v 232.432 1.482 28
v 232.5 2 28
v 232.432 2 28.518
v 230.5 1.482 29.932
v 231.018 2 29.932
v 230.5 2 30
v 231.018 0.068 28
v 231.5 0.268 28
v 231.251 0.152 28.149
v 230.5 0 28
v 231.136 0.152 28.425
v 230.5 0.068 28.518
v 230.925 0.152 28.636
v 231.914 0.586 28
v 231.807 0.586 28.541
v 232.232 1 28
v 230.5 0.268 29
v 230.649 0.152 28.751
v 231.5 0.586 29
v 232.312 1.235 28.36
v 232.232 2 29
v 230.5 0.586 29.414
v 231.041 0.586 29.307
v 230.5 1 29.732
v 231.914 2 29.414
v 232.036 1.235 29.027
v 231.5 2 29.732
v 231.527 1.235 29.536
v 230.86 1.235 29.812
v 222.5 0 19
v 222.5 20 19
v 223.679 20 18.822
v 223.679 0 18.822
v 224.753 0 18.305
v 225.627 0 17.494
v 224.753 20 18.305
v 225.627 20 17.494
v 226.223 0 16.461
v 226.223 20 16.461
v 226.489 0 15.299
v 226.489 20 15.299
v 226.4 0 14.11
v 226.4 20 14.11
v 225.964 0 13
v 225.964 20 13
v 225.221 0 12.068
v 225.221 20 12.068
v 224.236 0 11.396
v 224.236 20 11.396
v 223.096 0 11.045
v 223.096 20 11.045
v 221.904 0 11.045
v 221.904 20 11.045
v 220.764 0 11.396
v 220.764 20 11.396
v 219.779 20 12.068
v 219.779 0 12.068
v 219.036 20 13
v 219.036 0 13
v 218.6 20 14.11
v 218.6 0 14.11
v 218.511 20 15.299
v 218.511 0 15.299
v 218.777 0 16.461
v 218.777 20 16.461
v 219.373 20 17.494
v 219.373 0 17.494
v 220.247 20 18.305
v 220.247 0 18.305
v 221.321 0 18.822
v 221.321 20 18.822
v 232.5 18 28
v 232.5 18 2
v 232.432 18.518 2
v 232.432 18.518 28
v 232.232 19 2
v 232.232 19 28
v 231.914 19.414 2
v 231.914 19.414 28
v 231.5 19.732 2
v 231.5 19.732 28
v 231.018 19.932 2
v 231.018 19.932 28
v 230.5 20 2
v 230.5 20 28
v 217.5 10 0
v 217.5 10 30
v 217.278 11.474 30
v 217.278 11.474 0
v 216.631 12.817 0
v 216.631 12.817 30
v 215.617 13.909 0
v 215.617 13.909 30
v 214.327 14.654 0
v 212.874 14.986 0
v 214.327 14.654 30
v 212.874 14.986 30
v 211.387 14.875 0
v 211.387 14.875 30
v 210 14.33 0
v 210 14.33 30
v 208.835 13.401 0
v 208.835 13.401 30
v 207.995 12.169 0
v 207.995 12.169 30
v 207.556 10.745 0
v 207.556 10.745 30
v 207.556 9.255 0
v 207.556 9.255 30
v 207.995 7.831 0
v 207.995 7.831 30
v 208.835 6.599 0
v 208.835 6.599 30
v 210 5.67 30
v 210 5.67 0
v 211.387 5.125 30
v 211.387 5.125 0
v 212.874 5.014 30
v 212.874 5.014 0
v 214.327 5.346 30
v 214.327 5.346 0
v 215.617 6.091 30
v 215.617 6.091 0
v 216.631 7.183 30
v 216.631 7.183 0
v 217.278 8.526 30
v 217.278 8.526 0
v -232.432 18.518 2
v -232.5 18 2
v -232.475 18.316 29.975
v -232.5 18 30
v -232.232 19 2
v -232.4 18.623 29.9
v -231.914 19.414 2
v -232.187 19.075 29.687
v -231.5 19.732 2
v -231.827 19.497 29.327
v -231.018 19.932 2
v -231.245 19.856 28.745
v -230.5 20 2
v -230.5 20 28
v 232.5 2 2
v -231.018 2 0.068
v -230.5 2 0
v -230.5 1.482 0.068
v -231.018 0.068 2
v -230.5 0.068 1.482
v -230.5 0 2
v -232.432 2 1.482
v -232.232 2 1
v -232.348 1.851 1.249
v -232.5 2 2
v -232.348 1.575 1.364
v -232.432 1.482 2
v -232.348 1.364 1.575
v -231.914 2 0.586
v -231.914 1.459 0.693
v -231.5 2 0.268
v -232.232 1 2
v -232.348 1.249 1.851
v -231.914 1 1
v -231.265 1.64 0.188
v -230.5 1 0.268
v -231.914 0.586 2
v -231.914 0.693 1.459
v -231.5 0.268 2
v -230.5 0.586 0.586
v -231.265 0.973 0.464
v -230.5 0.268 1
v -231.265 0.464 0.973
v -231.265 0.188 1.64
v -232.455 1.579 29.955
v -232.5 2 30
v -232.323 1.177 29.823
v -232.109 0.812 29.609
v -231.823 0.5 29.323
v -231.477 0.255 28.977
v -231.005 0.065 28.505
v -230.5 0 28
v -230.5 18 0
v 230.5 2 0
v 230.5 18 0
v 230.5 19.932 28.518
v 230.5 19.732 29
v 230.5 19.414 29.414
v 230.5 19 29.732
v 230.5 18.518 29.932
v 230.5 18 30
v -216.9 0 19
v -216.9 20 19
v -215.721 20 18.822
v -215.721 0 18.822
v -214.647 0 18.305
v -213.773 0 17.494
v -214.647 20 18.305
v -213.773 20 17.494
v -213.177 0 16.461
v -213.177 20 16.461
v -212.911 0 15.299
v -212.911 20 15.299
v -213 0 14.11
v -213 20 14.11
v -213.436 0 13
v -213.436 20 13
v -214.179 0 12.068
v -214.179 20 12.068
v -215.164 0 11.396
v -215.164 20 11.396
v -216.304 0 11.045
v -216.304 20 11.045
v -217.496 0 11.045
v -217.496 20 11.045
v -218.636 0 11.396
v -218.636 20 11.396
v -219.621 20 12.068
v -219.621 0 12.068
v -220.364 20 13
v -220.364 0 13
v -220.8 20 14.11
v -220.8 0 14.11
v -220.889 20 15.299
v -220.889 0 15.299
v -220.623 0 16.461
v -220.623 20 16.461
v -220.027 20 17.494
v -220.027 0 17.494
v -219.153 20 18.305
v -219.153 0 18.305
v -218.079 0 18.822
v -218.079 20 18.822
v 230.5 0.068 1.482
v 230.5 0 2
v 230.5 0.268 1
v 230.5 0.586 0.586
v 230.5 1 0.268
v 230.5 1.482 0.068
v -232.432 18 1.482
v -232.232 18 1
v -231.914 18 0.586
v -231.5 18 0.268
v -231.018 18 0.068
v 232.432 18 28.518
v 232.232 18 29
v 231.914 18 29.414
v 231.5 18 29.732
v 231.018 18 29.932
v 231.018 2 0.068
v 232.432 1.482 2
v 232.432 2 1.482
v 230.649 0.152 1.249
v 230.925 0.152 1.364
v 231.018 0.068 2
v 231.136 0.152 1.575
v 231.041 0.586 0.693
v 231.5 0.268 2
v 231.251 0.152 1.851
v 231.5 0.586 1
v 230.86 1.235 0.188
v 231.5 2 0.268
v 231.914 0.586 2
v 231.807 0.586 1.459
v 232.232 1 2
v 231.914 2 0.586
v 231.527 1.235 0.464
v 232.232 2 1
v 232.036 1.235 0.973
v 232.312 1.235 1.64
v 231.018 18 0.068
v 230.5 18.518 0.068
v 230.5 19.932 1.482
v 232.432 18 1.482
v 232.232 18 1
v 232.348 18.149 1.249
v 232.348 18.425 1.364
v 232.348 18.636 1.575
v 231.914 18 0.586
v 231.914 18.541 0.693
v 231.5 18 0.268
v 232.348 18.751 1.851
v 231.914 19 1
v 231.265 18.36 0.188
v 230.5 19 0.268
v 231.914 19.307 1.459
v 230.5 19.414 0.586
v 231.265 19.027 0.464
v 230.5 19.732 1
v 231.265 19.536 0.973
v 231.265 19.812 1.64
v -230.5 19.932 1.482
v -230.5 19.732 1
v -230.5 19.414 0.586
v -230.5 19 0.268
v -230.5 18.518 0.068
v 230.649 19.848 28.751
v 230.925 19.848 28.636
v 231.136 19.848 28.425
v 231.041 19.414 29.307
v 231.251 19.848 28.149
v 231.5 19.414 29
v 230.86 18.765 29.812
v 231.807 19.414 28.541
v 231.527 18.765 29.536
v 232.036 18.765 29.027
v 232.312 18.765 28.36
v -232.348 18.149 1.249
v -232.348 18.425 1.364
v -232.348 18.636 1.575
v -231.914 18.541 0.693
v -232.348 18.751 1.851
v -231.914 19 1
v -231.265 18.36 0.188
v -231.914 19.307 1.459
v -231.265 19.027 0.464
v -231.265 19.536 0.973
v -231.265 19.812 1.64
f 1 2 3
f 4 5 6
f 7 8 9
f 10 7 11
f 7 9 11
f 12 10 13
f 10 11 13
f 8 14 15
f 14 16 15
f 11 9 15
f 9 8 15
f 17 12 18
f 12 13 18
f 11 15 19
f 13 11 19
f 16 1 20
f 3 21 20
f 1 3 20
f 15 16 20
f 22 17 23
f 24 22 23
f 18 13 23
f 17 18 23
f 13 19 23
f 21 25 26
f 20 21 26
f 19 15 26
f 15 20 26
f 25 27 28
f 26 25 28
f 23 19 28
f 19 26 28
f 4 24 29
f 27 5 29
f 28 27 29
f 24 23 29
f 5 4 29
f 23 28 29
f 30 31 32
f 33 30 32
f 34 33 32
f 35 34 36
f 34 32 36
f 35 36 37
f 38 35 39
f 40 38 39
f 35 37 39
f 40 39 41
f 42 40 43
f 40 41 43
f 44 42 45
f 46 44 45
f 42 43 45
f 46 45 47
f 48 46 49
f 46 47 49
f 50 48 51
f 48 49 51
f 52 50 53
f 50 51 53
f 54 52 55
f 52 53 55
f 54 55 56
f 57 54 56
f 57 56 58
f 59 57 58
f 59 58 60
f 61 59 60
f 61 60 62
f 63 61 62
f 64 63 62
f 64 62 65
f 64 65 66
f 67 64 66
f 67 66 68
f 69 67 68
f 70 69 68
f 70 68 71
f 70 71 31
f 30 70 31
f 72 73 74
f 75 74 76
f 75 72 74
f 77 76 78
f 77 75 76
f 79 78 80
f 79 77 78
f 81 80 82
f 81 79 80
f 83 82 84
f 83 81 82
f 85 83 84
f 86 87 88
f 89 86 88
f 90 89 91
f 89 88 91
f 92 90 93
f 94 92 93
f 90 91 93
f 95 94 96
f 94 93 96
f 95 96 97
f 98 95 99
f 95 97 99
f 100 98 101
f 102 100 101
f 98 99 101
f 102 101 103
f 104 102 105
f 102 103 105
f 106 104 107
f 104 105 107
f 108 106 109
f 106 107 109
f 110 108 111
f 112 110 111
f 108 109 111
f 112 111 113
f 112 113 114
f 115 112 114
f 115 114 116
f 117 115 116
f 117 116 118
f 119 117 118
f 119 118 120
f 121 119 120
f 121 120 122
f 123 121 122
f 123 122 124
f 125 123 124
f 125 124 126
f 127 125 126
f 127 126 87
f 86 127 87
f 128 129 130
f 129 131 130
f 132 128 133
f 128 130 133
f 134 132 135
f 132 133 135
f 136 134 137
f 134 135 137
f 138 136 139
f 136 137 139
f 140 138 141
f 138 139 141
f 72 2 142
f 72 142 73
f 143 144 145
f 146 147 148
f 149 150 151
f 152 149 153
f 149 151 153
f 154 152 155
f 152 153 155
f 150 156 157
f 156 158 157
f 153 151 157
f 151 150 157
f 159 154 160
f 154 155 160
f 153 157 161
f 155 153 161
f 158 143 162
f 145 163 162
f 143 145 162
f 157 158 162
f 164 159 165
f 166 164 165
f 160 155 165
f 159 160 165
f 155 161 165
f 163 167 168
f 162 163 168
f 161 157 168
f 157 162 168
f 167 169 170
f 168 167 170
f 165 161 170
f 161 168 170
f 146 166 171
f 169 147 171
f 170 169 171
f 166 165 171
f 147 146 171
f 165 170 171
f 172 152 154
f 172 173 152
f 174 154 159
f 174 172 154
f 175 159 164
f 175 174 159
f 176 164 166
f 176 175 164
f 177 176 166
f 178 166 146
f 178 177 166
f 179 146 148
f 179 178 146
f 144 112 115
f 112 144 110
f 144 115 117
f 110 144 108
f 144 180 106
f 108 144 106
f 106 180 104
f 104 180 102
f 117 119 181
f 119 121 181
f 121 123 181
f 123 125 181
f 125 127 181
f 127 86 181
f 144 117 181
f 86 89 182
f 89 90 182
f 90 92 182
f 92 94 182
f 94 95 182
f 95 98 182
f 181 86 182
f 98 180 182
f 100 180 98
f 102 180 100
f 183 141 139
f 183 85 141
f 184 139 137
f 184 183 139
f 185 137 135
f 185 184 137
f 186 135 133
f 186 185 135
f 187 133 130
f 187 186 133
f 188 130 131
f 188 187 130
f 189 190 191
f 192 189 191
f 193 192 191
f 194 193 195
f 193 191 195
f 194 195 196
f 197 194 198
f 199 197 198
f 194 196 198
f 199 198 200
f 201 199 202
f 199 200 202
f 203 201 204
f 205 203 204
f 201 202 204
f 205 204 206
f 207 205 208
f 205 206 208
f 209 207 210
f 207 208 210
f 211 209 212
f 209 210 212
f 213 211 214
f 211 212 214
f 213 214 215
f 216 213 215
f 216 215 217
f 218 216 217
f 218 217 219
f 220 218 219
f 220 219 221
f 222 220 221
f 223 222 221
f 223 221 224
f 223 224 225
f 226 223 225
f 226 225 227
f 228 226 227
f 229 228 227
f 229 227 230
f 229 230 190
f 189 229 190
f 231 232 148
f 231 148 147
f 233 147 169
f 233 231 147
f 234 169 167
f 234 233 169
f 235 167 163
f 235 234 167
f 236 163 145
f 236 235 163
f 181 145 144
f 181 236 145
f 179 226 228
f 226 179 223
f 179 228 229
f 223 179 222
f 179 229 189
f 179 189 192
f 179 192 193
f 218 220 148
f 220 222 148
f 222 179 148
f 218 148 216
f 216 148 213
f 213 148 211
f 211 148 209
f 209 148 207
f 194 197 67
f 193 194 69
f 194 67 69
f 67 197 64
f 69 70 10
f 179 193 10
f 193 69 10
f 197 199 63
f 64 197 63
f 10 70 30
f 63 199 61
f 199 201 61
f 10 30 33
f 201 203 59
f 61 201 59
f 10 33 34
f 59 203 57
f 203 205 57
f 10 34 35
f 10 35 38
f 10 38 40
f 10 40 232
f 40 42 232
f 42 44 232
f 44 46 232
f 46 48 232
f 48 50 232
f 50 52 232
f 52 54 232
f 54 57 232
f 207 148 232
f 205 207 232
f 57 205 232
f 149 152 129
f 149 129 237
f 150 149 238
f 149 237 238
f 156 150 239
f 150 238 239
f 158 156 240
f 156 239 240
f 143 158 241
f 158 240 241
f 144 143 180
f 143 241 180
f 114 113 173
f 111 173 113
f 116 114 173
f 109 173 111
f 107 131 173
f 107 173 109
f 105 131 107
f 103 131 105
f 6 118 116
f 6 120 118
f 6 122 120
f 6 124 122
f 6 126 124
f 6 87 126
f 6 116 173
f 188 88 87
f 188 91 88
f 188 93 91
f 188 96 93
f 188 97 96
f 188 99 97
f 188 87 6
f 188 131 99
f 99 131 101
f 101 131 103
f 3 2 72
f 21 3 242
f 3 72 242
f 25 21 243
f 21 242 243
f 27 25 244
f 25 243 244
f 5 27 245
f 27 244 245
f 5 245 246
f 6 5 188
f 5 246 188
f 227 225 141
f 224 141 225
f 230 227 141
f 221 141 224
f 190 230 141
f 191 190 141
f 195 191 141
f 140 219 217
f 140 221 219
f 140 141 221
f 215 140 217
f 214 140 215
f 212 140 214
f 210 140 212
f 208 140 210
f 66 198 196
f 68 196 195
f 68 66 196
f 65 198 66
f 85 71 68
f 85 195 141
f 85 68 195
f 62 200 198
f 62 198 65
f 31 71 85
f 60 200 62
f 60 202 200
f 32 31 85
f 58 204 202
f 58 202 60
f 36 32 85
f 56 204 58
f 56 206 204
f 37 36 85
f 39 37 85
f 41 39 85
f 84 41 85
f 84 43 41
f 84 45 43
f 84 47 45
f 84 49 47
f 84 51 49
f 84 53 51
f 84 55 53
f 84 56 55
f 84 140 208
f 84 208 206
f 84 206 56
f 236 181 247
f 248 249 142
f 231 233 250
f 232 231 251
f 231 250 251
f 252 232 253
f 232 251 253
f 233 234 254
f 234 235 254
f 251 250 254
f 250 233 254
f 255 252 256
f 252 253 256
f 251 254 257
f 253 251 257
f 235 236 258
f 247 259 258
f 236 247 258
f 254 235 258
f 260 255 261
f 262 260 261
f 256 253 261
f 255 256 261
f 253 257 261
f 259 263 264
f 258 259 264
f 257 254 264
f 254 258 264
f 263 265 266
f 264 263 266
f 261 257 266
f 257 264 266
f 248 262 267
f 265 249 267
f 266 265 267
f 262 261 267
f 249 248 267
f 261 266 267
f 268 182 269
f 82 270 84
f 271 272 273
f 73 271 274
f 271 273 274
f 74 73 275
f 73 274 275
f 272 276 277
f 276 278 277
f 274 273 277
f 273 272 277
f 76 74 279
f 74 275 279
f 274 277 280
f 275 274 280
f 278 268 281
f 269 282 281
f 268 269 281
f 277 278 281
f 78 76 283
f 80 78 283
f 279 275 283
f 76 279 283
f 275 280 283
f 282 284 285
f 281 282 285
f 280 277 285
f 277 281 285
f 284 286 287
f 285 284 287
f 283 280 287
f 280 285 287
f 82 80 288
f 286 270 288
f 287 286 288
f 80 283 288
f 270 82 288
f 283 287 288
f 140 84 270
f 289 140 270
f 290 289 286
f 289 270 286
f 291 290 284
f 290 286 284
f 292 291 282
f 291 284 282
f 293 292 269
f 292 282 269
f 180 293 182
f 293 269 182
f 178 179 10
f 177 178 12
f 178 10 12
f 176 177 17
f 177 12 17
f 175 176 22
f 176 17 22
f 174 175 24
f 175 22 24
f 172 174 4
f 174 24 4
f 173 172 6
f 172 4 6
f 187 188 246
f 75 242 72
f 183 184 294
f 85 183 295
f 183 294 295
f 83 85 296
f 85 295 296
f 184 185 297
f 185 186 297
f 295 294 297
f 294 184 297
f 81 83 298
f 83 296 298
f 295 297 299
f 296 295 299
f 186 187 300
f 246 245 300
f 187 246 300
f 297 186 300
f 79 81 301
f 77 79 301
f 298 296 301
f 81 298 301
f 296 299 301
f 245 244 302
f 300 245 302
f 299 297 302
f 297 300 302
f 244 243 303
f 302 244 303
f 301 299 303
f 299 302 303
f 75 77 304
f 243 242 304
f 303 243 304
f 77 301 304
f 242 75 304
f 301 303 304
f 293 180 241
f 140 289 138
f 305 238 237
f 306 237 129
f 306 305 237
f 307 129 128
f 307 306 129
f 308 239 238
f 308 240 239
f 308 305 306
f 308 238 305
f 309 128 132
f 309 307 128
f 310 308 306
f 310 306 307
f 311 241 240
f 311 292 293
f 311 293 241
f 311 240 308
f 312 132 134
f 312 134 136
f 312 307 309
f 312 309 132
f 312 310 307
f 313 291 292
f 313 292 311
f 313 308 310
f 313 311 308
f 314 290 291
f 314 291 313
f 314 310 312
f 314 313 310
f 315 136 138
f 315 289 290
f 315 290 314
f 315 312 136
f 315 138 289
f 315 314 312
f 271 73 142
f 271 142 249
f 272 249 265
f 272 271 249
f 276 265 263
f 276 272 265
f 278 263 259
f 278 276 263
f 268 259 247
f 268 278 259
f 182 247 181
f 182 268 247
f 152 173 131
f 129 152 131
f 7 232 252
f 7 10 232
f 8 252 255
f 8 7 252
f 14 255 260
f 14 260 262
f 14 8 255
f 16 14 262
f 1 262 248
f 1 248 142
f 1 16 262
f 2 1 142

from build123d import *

# Parameters (mm, degrees)
SKETCH1_W           = 465
SKETCH1_H           = 20
BOSS_EXTRUDE1_DEPTH = 30
FILLET1_R           = 2
SKETCH3_R           = 4
CUT_EXTRUDE2_DEPTH  = 236.279089594
SKETCH5_R           = 5
CUT_EXTRUDE4_DEPTH  = 236.279089594
SKETCH8_R           = 4
CUT_EXTRUDE5_DEPTH  = 236.279089594


with BuildPart() as part:
    # Sketch1 → Boss-Extrude1 (new body)
    with BuildSketch(Plane.XY):
        with Locations((0, 10)):
            Rectangle(SKETCH1_W, SKETCH1_H)
    extrude(amount=BOSS_EXTRUDE1_DEPTH)

    # Fillet1
    fillet1_edges = [part.edges().sort_by_distance(p)[0] for p in [
        (232.5, 10, 30),
        (0, 20, 30),
        (0, 20, 0),
        (232.5, 10, 0),
        (0, 0, 0),
        (-232.5, 10, 0),
        (-232.5, 20, 15),
        (232.5, 20, 15),
        (232.5, 0, 15),
        (-232.5, 0, 15),
        (0, 0, 30),
    ]]
    fillet(fillet1_edges, radius=FILLET1_R)

    # Sketch3 → Cut-Extrude2 (cut, through all)
    with BuildSketch(Plane(origin=(0, 20, 0), x_dir=(1, 0, 0), z_dir=(0, 1, 0))):
        with Locations(Location((-216.9, -15, 0), (0, 0, 270))):
            Circle(SKETCH3_R)
    extrude(amount=-CUT_EXTRUDE2_DEPTH, mode=Mode.SUBTRACT)

    # Sketch5 → Cut-Extrude4 (cut, through all)
    with BuildSketch(Plane.XY.offset(30)):
        with Locations((212.5, 10)):
            Circle(SKETCH5_R)
    extrude(amount=-CUT_EXTRUDE4_DEPTH, mode=Mode.SUBTRACT)

    # Sketch8 → Cut-Extrude5 (cut, through all)
    with BuildSketch(Plane(origin=(0, 20, 0), x_dir=(1, 0, 0), z_dir=(0, 1, 0))):
        with Locations(Location((222.5, -15, 0), (0, 0, 270))):
            Circle(SKETCH8_R)
    extrude(amount=-CUT_EXTRUDE5_DEPTH, mode=Mode.SUBTRACT)


solid = part.part
